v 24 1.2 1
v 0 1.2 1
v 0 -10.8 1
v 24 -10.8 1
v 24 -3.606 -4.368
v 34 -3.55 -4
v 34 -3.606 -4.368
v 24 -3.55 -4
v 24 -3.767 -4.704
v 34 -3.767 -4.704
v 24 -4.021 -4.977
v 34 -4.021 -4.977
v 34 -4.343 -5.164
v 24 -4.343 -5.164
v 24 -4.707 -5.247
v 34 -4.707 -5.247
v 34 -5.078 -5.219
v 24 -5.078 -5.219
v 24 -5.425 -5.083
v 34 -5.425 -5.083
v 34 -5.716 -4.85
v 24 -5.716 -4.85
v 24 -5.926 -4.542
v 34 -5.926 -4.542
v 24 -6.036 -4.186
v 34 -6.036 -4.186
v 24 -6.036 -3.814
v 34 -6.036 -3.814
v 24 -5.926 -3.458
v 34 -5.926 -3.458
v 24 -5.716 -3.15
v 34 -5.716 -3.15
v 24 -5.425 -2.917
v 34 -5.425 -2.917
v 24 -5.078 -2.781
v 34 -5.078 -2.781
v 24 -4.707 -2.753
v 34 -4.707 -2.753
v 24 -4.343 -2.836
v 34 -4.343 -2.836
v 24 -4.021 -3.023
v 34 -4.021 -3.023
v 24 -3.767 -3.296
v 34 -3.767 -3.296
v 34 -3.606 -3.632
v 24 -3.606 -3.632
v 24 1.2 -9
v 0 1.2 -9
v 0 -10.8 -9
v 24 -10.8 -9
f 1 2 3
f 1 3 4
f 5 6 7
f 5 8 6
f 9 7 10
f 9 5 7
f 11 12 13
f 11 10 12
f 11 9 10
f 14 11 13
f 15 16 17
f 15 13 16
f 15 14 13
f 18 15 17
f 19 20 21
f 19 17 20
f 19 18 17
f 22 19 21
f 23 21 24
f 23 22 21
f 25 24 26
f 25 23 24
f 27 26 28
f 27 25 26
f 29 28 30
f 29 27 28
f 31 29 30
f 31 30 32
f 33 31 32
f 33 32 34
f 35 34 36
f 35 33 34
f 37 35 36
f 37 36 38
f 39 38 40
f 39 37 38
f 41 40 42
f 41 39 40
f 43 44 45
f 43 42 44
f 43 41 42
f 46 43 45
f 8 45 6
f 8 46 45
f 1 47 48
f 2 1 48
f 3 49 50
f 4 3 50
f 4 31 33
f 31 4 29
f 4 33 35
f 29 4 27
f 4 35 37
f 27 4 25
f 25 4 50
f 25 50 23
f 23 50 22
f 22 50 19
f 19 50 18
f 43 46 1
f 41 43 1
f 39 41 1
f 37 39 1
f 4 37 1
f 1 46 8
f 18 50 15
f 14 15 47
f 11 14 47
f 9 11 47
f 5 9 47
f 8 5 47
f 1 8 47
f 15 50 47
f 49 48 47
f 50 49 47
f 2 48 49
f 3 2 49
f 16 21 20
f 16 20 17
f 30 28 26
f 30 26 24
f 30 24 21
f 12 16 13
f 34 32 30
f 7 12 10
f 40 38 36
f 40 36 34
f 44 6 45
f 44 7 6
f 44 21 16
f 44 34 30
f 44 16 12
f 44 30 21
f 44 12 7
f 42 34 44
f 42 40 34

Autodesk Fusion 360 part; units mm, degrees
sketch "Esquisse1" plane through (0, 0, 0) normal (0, 0, 1) x (1, 0, 0)
  line L0 (0, 0) -> (2.4, 0)
  line L1 (2.4, 0) -> (2.4, 1.2)
  line L2 (2.4, 1.2) -> (0, 1.2)
  line L3 (0, 1.2) -> (0, 0)
  dimension "d1" = 2.4
  dimension "d2" = 1.2
extrude "Extrusion1" add sketch "Esquisse1" along normal blind 1
sketch "Esquisse2" plane through (2.4, 0, 0) normal (1, 0, 0) x (0, 1, 0)
  line L0 (0, 0) -> (1.2, 0)
  line L1 (1.2, 0) -> (1.2, 1)
  line L2 (1.2, 1) -> (0, 1)
  line L3 (0, 1) -> (0, 0)
  circle A0 centre (0.6, 0.5) radius 0.125
  dimension "d5" = 0.25
extrude "Extrusion2" add sketch "Esquisse2" along normal blind 1 contours A0
scale "Echelle1" factor 10 about (0, 1.2, 1) bodies 1
